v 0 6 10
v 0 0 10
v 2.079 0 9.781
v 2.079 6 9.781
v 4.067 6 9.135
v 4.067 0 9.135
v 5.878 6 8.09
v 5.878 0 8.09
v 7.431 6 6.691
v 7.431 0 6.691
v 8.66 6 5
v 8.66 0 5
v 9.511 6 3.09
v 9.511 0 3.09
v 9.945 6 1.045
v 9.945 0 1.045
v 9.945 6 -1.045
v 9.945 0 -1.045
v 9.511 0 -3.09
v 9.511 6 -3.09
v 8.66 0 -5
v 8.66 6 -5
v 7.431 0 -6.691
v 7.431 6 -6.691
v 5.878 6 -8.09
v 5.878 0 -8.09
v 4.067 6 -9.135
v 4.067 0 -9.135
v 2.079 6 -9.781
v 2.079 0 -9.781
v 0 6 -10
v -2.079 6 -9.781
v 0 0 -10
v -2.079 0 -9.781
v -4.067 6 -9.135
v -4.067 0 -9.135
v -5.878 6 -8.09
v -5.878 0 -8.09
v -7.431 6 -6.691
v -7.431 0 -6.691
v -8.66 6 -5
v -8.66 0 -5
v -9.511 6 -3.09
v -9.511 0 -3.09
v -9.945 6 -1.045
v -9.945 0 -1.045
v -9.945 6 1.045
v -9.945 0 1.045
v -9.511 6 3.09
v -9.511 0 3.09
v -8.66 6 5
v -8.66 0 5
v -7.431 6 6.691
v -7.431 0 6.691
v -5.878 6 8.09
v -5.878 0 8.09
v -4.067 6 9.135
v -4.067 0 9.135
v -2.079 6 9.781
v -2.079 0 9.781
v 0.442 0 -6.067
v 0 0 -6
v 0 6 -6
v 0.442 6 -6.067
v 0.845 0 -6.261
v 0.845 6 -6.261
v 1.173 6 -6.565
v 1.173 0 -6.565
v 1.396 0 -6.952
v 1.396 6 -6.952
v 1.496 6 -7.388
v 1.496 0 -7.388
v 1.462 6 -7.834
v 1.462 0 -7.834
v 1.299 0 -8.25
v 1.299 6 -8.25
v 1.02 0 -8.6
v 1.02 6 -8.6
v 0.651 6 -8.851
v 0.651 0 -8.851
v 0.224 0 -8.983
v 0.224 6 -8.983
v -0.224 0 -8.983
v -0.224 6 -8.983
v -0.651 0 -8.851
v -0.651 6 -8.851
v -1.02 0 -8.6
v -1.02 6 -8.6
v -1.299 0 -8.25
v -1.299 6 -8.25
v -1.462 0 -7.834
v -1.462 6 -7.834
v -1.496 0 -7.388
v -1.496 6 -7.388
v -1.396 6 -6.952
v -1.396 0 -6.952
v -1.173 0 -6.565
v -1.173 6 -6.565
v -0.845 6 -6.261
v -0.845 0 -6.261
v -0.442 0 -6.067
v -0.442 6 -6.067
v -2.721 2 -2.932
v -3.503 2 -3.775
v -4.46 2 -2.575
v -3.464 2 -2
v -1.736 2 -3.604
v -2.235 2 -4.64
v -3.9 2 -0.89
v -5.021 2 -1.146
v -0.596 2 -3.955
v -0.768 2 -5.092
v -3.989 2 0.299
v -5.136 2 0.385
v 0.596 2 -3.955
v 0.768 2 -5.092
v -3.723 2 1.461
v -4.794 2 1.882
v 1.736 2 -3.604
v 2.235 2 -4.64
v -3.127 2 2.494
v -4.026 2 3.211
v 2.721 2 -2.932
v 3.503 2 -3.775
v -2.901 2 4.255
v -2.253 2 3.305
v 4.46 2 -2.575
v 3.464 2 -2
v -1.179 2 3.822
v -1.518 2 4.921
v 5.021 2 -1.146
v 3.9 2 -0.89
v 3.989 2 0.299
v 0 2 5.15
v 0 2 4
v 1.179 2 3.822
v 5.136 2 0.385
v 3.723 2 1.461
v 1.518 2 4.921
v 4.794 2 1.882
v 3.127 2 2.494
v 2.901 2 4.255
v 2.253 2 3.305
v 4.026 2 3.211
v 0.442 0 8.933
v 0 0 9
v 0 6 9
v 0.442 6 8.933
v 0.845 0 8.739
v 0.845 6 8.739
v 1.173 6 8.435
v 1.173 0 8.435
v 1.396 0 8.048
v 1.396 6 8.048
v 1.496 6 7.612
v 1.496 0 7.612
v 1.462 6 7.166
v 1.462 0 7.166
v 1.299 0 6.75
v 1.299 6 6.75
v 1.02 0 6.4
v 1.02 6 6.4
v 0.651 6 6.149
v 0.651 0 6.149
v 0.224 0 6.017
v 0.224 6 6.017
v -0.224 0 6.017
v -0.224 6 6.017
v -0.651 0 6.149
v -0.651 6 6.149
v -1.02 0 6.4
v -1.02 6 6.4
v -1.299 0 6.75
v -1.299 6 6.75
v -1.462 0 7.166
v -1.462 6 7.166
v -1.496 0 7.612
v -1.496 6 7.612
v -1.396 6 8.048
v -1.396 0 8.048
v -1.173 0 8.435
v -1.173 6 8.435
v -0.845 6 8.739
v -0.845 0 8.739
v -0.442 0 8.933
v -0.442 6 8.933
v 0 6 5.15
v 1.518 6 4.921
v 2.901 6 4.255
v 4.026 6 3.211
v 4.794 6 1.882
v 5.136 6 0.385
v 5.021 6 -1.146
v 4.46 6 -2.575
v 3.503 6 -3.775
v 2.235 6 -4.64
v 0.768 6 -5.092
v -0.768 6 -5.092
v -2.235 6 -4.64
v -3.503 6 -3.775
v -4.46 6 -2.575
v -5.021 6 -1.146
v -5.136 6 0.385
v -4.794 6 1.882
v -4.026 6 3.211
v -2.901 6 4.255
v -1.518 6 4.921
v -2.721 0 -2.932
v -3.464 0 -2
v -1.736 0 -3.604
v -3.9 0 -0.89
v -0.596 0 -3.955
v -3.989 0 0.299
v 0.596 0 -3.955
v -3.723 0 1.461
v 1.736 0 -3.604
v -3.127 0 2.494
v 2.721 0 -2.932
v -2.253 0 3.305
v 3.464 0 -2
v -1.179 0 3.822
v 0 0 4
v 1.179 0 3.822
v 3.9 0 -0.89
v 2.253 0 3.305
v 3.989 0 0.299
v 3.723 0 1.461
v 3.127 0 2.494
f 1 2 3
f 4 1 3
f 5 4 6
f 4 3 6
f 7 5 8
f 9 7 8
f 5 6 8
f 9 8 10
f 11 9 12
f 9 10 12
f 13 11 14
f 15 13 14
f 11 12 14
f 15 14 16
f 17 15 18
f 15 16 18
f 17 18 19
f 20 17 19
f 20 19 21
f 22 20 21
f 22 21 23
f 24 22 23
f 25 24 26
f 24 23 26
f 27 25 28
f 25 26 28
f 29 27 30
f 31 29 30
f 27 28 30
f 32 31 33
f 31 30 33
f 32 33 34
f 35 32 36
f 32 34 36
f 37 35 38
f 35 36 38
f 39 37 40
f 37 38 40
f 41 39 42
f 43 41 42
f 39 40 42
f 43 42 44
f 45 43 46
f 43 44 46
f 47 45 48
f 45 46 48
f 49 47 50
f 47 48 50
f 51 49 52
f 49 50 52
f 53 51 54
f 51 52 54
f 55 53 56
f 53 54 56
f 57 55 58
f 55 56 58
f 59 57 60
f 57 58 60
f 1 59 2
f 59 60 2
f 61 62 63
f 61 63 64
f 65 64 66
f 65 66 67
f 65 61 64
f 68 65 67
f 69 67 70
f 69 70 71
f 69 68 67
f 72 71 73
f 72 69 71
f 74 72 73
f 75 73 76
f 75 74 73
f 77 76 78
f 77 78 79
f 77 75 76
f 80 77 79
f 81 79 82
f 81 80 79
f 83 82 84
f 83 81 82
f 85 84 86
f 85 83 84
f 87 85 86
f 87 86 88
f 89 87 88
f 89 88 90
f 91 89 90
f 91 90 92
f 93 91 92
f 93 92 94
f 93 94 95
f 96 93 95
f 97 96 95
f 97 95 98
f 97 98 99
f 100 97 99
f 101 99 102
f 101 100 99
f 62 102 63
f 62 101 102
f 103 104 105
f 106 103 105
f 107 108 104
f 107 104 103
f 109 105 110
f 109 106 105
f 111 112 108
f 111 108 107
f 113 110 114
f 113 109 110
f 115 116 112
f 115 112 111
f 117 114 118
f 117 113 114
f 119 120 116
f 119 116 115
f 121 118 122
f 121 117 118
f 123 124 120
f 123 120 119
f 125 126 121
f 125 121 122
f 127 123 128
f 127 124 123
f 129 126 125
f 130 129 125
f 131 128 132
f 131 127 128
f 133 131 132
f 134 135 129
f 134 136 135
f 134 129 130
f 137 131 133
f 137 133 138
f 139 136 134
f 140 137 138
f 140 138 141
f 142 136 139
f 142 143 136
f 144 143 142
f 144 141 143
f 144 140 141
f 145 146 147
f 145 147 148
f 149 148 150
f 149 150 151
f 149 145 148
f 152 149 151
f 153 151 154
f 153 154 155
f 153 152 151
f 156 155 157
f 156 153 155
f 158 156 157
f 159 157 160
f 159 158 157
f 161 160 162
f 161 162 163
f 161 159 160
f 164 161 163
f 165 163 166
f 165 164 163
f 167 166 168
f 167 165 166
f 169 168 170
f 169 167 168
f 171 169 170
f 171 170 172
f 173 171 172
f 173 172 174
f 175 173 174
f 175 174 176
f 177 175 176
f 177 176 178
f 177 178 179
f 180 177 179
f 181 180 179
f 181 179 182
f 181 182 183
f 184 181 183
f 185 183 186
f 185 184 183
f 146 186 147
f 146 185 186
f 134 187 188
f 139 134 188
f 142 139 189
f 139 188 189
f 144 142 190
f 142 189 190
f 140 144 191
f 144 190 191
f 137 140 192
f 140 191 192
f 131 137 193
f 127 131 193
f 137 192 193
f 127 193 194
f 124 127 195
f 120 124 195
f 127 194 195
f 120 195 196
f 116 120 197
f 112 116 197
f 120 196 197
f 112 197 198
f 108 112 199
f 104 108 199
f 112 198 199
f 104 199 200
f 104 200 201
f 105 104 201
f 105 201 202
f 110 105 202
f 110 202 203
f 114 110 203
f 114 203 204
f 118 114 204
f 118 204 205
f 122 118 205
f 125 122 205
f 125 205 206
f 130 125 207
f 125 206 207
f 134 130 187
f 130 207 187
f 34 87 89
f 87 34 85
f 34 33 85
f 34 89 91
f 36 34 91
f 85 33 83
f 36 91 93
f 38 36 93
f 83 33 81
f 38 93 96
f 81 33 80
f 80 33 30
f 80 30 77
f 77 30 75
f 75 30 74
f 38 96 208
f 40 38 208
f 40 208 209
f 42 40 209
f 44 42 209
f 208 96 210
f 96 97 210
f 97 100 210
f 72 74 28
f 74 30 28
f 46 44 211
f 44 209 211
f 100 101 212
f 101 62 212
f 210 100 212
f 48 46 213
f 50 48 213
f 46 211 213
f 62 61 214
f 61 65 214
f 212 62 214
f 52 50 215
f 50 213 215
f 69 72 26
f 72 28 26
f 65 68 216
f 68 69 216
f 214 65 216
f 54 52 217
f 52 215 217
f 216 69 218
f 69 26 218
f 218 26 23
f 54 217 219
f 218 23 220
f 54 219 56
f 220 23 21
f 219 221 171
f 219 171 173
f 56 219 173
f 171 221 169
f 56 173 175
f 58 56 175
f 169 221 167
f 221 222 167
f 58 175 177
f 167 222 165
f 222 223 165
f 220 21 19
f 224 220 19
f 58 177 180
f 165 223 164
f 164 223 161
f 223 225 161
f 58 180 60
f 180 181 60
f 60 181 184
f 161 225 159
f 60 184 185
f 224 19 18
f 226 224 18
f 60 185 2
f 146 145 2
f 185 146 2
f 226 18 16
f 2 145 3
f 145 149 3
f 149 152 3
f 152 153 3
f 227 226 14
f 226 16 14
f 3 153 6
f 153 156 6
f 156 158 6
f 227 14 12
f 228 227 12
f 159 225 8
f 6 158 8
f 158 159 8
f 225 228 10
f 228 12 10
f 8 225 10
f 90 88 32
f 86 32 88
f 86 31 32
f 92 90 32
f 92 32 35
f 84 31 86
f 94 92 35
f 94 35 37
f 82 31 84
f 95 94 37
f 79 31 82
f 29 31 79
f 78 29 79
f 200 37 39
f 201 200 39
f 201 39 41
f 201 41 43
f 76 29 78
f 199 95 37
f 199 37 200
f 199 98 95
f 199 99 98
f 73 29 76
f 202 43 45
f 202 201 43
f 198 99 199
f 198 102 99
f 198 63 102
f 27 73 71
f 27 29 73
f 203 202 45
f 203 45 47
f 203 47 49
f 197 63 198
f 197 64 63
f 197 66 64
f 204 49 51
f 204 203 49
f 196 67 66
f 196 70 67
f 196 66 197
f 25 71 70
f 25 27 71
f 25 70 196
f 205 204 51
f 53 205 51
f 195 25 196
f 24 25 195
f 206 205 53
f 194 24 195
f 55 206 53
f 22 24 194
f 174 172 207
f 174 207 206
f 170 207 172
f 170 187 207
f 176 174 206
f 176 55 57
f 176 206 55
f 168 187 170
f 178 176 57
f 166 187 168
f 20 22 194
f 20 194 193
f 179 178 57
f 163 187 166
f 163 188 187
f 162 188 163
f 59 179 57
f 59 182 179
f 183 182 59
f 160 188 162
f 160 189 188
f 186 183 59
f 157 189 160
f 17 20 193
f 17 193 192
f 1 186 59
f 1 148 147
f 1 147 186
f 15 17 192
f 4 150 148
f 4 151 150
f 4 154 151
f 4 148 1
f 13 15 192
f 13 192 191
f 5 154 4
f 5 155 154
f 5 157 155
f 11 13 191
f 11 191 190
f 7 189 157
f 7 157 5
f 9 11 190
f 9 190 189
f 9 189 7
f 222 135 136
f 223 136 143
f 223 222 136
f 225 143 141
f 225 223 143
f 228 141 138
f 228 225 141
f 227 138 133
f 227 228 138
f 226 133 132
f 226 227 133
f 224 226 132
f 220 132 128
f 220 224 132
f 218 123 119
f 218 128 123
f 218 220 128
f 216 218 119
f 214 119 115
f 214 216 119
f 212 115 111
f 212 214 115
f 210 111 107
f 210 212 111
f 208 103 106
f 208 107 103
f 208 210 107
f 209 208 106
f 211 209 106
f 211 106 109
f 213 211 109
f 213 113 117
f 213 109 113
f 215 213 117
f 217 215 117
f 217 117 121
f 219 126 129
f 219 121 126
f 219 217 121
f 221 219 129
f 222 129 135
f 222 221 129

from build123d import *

# Parameters (mm, degrees)
SKETCH_1_R          = 10
SKETCH_1_R_2        = 1.5
SKETCH_1_R_3        = 4
EXTRUDE_1_DEPTH     = 6
SKETCH_2_R          = 5.15
CUT_EXTRUDE_1_DEPTH = 4


with BuildPart() as part:
    # Эскиз1 → Бобышка-Вытянуть1 (new body)
    with BuildSketch(Plane(origin=(0, 0, 0), x_dir=(1, 0, 0), z_dir=(0, 1, 0))):
        with Locations(Location((0, 0, 0), (0, 0, 270))):
            Circle(SKETCH_1_R)
        with Locations(Location((0, 7.5, 0), (0, 0, 270))):
            Circle(SKETCH_1_R_2, mode=Mode.SUBTRACT)
        with Locations(Location((0, -7.5, 0), (0, 0, 270))):
            Circle(SKETCH_1_R_2, mode=Mode.SUBTRACT)
        with Locations(Location((0, 0, 0), (0, 0, 270))):
            Circle(SKETCH_1_R_3, mode=Mode.SUBTRACT)
    extrude(amount=EXTRUDE_1_DEPTH)

    # Эскиз2 → Вырез-Вытянуть1 (cut)
    with BuildSketch(Plane(origin=(0, 6, 0), x_dir=(1, 0, 0), z_dir=(0, 1, 0))):
        with Locations(Location((0, 0, 0), (0, 0, 270))):
            Circle(SKETCH_2_R)
    extrude(amount=-CUT_EXTRUDE_1_DEPTH, mode=Mode.SUBTRACT)


solid = part.part
